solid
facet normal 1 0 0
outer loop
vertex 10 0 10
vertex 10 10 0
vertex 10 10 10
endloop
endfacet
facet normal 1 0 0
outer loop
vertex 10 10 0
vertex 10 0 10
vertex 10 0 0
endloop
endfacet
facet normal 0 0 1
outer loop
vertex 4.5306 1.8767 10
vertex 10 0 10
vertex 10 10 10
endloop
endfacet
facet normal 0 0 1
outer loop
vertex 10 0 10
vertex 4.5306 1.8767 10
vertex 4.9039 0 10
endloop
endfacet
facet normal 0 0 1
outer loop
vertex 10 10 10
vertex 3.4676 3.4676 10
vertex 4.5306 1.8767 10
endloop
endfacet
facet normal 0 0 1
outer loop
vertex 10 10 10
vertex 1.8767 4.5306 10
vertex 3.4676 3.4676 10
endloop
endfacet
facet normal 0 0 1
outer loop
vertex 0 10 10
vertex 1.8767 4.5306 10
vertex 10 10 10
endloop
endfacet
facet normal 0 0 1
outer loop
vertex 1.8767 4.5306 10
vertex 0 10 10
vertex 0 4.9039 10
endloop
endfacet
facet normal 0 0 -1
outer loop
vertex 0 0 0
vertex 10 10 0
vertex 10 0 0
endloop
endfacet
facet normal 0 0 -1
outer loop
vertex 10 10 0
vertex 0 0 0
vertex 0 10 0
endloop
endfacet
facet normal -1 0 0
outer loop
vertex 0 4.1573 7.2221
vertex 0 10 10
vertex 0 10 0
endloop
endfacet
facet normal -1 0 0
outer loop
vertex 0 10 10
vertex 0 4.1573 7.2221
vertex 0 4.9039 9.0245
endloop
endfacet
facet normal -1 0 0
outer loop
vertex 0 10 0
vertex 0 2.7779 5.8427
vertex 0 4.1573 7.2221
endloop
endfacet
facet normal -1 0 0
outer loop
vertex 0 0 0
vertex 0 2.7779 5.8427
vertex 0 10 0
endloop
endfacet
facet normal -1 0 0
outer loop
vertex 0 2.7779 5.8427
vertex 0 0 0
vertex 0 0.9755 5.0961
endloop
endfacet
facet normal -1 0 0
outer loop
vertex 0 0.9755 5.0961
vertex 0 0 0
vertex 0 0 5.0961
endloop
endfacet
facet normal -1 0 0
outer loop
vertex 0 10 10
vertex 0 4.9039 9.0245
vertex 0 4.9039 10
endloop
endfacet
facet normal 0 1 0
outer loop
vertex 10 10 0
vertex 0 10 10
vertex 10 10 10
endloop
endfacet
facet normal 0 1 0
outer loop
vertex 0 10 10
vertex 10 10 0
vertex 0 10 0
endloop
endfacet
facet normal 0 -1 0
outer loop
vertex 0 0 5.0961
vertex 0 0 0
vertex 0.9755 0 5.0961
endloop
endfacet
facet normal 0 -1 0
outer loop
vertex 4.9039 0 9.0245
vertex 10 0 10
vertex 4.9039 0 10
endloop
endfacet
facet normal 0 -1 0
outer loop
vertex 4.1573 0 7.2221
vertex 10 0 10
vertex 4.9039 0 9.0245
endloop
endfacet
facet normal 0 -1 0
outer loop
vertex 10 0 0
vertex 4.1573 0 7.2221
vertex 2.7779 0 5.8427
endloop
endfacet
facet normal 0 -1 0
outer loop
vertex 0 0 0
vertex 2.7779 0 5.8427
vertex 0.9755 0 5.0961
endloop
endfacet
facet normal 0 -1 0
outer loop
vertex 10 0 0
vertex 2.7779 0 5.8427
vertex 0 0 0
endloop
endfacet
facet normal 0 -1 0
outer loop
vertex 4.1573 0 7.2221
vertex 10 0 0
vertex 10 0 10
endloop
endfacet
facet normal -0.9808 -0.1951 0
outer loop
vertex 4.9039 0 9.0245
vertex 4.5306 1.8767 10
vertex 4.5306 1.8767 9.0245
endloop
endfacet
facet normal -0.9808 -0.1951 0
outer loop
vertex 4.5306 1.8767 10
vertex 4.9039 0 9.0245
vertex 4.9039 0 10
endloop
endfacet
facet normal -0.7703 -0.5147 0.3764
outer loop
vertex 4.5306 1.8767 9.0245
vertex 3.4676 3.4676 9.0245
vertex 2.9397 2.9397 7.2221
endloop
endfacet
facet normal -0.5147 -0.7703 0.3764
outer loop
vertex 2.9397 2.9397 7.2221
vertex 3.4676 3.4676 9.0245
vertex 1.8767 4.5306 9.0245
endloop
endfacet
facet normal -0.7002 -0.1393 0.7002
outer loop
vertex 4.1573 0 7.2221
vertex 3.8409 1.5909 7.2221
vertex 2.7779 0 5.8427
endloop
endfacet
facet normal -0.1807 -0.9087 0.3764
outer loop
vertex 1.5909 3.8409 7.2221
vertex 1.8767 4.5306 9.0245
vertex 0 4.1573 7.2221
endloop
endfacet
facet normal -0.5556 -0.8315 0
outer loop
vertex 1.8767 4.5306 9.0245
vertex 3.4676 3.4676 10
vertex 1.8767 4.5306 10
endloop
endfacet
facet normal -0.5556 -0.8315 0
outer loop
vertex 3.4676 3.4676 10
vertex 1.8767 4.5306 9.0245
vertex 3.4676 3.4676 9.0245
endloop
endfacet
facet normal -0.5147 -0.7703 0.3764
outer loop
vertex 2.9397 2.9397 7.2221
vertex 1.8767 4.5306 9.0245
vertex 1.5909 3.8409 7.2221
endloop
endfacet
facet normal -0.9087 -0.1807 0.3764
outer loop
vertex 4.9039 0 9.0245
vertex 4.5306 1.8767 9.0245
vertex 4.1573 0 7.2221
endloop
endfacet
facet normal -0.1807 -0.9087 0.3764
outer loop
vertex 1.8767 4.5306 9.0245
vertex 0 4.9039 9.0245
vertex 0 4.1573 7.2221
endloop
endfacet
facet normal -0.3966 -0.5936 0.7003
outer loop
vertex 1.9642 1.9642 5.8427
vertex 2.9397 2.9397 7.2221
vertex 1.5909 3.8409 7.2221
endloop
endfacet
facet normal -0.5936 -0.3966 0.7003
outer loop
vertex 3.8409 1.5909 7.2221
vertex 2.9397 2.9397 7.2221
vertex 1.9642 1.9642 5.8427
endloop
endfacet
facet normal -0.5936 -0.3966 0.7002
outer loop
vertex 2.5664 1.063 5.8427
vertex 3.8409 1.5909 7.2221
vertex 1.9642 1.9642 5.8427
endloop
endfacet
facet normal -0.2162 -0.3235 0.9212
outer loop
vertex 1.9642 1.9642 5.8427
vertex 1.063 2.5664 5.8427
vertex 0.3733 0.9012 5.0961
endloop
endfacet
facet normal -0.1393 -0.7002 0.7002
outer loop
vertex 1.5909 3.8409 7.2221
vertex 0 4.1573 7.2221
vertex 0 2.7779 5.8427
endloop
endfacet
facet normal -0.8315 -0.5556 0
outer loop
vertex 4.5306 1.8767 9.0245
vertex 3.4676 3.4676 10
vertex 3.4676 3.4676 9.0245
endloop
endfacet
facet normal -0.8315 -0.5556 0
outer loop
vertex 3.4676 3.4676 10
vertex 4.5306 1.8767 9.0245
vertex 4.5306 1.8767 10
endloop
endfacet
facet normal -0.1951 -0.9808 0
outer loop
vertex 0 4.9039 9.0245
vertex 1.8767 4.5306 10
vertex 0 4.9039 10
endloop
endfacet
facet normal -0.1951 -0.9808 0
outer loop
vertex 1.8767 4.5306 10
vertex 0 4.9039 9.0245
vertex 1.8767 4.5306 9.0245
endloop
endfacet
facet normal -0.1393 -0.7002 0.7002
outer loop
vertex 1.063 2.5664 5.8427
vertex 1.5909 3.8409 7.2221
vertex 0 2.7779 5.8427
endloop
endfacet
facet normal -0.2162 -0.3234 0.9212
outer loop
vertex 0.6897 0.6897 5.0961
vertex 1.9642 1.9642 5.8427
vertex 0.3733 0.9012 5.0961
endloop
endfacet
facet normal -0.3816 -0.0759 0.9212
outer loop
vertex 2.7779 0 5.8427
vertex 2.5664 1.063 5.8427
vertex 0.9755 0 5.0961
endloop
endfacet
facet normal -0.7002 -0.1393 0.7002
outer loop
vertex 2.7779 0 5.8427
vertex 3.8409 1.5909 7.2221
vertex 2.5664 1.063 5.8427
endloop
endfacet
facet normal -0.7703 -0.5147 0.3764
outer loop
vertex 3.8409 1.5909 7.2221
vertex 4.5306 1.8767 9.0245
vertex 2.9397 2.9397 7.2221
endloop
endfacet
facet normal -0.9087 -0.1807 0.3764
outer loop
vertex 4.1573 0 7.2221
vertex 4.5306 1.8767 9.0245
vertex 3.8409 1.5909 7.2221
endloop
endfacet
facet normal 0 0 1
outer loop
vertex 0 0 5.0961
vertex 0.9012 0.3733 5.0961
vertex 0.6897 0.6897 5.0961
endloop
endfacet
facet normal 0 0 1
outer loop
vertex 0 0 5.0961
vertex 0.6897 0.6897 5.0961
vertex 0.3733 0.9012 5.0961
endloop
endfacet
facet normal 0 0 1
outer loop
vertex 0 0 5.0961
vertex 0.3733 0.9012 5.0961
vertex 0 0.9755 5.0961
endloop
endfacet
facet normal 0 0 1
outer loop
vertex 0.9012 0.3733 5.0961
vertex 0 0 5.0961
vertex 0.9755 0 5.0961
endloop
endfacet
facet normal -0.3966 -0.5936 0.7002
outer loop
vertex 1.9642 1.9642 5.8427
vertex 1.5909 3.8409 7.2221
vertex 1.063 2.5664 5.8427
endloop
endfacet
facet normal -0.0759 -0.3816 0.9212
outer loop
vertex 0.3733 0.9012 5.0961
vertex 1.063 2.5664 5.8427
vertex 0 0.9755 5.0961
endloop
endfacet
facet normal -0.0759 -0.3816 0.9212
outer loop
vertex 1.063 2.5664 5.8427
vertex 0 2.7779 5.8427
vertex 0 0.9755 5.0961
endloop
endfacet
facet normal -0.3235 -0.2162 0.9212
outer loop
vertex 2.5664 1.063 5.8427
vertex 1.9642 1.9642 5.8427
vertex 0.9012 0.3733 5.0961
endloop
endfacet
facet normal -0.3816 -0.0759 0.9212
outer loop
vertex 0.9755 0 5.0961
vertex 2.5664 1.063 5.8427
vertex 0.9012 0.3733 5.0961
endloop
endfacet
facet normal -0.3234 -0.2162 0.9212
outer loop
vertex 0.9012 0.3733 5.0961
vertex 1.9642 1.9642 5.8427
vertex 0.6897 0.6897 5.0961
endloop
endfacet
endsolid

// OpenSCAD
difference() {
  cube(size=[10, 10, 10], center=false);
  translate(v=[0, 0, 10]) {
    sphere(r=5);
  }
}
